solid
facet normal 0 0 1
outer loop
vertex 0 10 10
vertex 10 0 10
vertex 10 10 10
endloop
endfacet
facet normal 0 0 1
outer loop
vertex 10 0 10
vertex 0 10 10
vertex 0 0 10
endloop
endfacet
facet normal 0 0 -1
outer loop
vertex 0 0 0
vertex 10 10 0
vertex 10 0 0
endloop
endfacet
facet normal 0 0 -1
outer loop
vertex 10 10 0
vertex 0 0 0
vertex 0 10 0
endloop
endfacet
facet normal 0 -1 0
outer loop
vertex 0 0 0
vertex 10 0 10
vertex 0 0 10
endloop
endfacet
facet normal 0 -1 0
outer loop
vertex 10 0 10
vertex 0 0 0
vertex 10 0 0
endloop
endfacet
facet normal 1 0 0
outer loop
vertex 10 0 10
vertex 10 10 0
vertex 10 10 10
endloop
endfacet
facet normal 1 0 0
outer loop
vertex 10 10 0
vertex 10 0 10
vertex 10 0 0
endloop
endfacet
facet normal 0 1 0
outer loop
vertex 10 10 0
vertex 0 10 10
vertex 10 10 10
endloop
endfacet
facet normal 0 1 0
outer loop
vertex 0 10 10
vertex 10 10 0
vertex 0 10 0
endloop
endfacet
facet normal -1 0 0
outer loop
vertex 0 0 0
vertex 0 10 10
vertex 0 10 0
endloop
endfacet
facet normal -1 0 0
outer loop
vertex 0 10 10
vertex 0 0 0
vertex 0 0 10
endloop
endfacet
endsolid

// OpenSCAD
// Generated by CadMonkey
// Prompt: hey cadmonkey, create me a cube
// Generated at: 2025-11-10 16:47:37

cube(size = 10);
